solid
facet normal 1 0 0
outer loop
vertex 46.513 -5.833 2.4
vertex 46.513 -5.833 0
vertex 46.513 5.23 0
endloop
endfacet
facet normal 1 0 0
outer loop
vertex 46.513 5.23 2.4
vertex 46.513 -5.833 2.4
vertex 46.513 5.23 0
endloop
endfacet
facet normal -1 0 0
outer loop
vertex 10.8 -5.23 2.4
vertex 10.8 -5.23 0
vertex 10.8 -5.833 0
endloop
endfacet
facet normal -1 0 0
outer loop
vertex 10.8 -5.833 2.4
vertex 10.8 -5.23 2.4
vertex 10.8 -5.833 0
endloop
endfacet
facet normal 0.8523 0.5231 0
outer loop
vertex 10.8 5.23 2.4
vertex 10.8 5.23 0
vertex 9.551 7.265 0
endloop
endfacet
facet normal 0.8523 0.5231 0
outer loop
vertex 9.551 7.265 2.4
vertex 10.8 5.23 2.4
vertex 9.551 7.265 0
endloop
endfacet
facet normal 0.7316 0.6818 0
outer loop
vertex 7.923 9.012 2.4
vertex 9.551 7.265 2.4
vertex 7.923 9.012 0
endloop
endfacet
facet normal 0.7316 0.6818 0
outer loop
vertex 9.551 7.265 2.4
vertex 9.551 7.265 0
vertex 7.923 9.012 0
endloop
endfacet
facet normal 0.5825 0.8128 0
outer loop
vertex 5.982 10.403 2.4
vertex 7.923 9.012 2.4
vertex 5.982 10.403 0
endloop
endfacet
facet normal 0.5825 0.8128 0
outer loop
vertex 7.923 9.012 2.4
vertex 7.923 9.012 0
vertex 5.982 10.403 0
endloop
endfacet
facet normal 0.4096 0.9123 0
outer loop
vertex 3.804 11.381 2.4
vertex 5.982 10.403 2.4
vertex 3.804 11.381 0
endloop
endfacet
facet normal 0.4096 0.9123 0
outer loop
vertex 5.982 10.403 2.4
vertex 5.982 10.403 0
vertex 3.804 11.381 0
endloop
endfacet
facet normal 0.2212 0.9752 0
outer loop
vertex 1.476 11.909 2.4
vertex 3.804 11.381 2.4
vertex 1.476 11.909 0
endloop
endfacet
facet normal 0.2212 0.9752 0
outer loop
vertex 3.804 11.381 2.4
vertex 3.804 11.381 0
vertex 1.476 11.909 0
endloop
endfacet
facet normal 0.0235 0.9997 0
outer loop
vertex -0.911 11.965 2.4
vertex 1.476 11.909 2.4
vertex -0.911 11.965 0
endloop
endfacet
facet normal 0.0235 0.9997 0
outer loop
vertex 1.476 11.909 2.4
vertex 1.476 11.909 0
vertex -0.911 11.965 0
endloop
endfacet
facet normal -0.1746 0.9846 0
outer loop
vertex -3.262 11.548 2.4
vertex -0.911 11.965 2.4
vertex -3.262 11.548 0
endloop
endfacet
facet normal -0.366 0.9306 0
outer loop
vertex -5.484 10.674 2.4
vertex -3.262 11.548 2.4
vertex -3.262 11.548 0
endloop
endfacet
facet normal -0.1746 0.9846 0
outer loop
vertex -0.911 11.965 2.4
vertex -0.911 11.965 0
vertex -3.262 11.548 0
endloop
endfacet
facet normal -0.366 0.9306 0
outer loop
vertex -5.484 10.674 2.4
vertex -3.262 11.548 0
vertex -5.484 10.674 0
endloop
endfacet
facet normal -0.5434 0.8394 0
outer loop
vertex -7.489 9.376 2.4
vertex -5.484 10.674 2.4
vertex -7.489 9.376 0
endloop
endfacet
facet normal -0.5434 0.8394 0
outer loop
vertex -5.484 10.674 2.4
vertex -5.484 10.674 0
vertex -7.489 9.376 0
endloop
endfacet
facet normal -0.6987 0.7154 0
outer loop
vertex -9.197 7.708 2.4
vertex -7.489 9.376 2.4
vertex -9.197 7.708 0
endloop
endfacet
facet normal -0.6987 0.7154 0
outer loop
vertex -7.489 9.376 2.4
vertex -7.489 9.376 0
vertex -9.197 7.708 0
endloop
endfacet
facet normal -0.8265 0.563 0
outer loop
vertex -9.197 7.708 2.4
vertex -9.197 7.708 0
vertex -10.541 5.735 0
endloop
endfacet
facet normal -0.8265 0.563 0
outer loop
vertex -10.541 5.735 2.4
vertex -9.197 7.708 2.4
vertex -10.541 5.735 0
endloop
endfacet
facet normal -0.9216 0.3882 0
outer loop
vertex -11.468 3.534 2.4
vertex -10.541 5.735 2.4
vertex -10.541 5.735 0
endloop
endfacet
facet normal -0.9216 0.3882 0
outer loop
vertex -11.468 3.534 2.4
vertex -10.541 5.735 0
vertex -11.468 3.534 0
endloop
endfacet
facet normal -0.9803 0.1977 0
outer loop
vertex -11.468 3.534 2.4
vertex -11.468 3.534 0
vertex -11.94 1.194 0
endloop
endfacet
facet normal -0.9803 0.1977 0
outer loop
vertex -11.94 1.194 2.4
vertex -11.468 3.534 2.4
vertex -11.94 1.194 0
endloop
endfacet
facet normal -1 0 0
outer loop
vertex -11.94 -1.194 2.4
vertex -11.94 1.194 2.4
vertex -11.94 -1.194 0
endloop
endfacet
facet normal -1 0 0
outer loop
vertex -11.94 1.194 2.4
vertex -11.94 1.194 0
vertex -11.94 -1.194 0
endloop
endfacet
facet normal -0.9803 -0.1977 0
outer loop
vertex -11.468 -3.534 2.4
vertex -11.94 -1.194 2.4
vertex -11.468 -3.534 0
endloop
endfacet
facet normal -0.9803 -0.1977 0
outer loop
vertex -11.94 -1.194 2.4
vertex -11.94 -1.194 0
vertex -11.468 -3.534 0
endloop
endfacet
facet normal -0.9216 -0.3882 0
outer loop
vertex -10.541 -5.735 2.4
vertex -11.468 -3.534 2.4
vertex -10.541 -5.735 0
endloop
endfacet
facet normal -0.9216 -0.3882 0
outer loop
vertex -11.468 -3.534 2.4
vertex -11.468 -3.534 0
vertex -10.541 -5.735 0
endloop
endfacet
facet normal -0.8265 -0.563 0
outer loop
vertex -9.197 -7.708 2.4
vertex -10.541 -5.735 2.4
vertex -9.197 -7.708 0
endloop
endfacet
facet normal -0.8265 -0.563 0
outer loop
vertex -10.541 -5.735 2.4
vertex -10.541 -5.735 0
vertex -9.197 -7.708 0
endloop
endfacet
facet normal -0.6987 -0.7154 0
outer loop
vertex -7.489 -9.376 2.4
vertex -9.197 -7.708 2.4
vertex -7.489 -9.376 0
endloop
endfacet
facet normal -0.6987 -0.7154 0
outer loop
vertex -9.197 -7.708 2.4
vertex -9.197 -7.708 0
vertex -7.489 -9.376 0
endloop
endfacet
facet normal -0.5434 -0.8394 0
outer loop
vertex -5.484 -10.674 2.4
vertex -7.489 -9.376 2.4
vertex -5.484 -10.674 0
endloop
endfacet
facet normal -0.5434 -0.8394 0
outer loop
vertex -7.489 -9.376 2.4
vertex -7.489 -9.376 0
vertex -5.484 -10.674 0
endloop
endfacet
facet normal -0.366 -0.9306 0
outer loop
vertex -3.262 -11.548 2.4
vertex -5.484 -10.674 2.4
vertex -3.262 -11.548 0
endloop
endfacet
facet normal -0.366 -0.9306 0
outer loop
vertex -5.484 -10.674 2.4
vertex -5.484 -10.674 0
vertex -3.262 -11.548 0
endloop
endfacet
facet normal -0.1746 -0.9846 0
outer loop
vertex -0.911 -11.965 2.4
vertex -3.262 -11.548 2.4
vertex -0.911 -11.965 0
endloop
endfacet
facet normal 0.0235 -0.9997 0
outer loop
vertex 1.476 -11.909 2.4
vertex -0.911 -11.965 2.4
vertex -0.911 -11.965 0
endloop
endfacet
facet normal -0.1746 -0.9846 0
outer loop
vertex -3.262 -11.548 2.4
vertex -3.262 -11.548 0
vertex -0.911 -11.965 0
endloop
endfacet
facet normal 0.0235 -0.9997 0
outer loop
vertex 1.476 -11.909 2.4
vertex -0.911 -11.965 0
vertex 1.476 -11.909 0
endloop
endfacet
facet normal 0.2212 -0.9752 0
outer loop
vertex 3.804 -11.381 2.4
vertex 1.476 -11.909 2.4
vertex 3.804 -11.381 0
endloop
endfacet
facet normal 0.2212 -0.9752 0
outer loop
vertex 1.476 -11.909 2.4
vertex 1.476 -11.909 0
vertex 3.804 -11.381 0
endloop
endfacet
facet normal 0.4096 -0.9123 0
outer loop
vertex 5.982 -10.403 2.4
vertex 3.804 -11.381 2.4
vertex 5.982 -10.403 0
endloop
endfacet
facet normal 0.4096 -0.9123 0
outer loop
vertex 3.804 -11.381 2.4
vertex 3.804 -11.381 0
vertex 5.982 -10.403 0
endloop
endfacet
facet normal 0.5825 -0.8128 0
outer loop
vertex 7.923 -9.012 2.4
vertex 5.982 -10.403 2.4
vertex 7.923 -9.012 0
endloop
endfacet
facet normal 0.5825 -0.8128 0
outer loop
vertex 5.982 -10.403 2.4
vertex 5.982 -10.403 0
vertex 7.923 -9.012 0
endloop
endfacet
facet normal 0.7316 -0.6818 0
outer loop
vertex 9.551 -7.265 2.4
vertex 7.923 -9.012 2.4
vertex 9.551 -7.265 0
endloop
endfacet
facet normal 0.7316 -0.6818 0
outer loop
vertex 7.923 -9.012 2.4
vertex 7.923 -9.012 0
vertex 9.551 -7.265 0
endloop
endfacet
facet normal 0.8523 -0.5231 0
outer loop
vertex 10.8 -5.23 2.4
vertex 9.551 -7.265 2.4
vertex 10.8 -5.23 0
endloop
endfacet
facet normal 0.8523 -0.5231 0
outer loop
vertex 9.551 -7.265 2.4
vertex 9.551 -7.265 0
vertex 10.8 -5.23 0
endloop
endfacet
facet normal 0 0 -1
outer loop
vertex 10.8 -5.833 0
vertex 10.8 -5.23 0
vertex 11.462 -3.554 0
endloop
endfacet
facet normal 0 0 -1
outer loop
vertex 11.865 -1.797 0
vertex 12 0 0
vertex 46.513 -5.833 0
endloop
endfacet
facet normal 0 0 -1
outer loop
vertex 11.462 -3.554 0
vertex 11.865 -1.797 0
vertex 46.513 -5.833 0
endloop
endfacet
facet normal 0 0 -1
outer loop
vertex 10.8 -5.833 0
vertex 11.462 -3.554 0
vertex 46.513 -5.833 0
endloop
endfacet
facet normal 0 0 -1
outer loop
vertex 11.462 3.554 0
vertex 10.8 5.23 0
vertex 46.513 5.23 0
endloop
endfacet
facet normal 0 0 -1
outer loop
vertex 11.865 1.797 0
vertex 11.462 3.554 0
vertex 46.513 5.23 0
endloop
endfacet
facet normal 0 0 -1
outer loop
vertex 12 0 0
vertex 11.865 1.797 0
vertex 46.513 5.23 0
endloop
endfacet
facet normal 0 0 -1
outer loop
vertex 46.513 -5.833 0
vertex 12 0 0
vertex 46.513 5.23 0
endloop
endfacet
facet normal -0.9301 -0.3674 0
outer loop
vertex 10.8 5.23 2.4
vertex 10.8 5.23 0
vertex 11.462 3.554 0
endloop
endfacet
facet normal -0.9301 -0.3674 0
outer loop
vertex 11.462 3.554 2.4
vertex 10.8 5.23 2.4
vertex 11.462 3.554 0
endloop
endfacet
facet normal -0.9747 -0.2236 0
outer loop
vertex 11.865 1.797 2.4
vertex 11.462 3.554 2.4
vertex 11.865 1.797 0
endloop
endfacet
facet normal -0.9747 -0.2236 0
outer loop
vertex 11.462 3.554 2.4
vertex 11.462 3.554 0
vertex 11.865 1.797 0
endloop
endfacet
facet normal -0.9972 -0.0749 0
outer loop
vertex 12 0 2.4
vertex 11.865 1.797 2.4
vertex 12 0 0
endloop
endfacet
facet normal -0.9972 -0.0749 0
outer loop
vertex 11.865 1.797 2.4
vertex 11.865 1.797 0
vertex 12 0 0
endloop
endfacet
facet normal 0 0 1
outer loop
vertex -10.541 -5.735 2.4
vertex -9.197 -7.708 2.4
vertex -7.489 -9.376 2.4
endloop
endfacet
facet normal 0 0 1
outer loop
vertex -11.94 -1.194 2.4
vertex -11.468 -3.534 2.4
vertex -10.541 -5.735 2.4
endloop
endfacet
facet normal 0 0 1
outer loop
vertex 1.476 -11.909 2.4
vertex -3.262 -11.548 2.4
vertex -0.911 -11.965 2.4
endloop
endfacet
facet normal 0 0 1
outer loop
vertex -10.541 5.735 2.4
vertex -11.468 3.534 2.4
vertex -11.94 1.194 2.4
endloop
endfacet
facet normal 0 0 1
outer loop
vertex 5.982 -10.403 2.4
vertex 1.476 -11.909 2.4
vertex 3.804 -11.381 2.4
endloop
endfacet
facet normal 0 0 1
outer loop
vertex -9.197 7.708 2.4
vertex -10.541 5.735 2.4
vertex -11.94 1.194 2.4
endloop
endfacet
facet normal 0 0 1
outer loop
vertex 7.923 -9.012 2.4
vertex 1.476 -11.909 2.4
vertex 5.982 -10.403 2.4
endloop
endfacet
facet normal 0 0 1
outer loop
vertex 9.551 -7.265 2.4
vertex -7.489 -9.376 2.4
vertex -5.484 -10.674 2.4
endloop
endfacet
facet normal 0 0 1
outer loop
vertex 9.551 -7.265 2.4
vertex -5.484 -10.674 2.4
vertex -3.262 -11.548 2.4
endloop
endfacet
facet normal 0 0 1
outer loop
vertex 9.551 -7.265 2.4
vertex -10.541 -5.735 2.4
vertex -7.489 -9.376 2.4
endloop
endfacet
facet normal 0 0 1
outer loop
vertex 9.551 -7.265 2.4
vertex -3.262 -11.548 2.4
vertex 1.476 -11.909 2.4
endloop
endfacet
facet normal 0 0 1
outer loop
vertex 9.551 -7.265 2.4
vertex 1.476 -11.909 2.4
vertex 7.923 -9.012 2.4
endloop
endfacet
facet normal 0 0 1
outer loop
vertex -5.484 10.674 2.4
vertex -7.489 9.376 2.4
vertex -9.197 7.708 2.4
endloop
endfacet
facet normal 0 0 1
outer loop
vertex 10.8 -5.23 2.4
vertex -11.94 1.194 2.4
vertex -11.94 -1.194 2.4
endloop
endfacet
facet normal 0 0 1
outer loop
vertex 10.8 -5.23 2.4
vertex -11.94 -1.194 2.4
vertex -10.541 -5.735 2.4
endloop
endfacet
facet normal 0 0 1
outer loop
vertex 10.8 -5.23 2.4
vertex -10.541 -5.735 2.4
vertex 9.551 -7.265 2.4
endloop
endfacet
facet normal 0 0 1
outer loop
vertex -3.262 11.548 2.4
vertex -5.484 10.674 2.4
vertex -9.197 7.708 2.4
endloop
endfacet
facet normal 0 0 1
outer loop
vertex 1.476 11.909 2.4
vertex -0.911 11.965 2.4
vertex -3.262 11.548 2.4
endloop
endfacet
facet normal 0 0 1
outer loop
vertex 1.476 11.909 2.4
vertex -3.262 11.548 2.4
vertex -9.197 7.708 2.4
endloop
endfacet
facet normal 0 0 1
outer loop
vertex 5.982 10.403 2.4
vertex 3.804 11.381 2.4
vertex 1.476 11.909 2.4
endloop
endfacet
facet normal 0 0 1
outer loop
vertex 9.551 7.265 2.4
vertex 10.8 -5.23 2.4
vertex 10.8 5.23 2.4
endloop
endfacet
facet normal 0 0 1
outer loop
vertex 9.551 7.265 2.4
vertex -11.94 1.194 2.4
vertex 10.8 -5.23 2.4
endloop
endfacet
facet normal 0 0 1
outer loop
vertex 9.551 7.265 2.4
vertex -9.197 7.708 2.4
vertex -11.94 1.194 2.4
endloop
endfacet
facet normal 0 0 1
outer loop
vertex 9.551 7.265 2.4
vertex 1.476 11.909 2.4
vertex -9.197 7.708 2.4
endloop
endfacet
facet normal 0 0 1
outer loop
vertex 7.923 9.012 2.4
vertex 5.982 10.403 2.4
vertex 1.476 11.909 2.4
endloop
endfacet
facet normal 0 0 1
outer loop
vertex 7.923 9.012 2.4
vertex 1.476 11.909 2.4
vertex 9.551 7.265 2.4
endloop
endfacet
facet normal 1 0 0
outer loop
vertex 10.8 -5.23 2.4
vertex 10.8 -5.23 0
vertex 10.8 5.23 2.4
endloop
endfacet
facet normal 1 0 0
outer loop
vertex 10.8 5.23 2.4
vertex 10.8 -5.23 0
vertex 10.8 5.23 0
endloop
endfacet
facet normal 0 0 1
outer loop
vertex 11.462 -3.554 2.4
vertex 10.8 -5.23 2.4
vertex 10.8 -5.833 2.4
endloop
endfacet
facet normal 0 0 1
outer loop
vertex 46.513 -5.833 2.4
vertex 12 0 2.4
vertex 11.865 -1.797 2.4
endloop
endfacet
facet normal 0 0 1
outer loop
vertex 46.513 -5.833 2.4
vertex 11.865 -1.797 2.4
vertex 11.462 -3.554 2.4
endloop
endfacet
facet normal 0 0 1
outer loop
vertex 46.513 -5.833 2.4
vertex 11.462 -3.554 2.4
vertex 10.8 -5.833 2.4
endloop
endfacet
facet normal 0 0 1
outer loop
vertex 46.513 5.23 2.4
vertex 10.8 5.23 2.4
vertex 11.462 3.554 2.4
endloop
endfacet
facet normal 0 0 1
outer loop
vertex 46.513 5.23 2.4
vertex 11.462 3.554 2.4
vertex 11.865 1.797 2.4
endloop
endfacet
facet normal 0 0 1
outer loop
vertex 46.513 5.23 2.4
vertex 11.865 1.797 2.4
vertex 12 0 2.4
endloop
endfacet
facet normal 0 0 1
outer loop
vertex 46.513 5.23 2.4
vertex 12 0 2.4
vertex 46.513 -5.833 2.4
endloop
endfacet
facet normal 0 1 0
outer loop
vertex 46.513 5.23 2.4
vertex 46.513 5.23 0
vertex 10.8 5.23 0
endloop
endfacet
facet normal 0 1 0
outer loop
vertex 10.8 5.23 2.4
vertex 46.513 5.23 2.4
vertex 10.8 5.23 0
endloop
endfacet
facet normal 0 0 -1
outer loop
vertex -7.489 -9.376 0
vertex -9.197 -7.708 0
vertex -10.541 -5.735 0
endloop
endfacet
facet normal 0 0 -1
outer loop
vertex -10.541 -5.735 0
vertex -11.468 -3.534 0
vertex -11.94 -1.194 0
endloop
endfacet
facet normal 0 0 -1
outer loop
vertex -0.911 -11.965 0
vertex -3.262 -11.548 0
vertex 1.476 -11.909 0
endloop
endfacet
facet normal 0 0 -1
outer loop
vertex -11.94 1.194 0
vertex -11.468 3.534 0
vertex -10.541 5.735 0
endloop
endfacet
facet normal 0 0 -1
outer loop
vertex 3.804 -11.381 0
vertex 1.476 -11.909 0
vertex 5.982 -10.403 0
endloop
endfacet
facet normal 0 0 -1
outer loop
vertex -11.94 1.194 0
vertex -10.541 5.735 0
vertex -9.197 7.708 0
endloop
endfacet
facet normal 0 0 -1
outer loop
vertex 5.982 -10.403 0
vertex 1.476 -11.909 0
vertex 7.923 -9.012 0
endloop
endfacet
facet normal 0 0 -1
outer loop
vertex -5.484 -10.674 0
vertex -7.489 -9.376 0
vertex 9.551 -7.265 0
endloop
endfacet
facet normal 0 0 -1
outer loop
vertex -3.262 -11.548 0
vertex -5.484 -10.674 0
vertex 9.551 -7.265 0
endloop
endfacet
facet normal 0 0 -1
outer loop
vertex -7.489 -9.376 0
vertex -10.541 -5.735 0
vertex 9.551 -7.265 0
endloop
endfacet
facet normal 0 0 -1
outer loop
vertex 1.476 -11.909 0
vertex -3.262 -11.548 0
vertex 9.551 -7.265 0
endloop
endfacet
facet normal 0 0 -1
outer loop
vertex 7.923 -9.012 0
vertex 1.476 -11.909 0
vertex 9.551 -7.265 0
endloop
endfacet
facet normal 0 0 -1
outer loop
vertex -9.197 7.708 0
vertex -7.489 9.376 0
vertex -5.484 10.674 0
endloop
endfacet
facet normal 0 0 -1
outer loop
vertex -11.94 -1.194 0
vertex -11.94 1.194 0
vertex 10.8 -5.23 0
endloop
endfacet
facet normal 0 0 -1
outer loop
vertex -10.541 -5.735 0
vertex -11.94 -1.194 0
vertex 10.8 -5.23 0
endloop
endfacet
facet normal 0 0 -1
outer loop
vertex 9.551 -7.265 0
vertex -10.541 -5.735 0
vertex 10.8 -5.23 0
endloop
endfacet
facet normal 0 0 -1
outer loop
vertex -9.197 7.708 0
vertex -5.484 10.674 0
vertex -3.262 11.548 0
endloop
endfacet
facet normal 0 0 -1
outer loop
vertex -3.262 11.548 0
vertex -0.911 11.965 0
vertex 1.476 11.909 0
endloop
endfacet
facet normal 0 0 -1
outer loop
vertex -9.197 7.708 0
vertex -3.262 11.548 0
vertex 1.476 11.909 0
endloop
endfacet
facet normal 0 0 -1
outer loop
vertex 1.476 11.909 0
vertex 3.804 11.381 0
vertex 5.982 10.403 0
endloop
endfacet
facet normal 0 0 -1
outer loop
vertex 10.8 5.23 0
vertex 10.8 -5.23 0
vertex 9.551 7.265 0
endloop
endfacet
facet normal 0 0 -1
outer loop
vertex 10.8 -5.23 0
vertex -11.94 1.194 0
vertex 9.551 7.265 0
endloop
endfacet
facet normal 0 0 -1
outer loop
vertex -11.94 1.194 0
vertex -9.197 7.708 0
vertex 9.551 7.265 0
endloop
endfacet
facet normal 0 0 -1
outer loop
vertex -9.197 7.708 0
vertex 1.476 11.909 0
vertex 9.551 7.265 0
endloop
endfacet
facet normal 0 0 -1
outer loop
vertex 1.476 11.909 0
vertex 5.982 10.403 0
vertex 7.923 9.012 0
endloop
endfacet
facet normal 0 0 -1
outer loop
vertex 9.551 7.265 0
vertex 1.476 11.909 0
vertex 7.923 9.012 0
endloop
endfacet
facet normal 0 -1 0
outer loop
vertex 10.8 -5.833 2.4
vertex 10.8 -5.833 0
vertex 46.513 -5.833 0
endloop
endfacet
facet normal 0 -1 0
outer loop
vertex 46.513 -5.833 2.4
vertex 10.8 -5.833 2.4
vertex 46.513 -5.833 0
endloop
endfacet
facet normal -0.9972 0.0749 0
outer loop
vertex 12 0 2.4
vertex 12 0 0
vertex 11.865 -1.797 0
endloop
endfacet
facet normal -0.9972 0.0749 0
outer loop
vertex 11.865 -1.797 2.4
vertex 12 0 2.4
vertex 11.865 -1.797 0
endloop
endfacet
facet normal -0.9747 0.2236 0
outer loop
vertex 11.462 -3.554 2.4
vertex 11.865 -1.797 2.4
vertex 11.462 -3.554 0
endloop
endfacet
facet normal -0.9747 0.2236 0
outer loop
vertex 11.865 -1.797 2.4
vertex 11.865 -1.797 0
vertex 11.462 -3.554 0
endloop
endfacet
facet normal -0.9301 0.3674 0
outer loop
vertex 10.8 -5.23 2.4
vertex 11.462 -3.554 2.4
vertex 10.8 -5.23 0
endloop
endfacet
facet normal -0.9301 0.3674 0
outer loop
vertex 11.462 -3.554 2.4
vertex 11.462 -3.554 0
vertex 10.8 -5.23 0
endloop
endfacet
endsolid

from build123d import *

# Parameters (mm, degrees)
F1_DEPTH = 2.4


with BuildPart() as f1:
    # F0 (on Top) → F1 (new body)
    with BuildSketch(Plane.XY):
        with BuildLine():
            Line((10.800133, -5.230403), (10.800133, 5.230403))
            ThreePointArc((10.800133, 5.230403), (-12, 0), (10.800133, -5.230403))
        make_face()
        with BuildLine():
            ThreePointArc((10.800133, 5.230403), (11.696187, 2.683132), (12, 0))
            ThreePointArc((12, 0), (11.696187, -2.683132), (10.800133, -5.230403))
            Line((10.800133, -5.230403), (10.800133, -5.833334))
            Line((10.800133, -5.833334), (46.513163, -5.833334))
            Line((46.513163, -5.833334), (46.513163, 5.230403))
            Line((46.513163, 5.230403), (10.800133, 5.230403))
        make_face()
    extrude(amount=F1_DEPTH)


solid = f1.part
